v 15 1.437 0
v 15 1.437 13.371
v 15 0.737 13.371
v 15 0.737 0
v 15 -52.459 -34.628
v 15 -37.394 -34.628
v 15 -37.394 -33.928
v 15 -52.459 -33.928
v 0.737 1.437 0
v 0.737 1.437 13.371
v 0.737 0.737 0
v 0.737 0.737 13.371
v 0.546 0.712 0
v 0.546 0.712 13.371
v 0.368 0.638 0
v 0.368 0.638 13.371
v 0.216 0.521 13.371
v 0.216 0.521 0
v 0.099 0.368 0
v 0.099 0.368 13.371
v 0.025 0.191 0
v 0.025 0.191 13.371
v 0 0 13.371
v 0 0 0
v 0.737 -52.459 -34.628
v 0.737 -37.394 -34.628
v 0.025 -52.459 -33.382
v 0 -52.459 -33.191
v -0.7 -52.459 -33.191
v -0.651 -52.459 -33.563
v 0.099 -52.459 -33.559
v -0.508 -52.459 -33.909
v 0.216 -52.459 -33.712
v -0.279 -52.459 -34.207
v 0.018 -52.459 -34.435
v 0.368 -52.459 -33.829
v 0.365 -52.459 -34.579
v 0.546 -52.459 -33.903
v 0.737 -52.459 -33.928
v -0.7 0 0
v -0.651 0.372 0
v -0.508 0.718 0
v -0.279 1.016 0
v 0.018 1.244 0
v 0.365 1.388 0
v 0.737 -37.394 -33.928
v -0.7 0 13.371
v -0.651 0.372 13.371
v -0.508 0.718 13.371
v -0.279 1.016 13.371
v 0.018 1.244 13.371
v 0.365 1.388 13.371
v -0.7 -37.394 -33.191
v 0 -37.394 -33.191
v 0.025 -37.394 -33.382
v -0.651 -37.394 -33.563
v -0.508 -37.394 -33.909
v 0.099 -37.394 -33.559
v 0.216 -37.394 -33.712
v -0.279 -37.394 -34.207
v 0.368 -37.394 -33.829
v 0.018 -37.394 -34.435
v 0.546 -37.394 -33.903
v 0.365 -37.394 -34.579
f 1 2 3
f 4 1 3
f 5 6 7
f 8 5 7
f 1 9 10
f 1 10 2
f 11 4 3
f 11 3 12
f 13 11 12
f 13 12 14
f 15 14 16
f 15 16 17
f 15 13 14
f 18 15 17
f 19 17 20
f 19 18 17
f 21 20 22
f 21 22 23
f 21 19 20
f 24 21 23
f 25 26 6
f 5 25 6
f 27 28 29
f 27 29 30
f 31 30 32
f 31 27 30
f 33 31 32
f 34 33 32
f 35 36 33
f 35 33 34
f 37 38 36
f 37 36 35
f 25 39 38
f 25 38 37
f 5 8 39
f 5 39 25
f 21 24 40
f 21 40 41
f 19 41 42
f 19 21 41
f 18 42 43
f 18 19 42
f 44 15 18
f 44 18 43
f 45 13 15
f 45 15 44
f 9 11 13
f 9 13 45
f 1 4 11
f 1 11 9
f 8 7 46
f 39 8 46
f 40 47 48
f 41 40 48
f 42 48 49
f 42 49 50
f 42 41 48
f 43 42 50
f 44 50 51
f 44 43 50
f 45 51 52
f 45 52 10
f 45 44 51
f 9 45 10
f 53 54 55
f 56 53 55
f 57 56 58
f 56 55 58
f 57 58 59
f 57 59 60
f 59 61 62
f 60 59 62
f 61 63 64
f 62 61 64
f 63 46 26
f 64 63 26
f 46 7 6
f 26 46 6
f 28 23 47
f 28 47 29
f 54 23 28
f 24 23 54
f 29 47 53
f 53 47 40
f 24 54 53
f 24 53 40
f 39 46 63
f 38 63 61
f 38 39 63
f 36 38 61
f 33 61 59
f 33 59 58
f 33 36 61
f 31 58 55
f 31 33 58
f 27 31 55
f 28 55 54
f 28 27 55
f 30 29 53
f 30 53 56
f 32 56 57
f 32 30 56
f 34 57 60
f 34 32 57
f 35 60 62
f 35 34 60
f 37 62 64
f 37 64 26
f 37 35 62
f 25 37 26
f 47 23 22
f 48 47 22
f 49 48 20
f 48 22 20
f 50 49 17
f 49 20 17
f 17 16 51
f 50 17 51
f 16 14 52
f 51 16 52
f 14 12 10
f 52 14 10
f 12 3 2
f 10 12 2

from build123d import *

# Parameters (mm, degrees)
BASE_FLANGE1_DEPTH      = 0.7
EDGE_FLANGE1_DEPTH      = 13.370958639
EDGE_FLANGE1_BEND_DEPTH = 15.064251929


# Sheet-metal steps are written as plain solids
with BuildPart() as part:
    # Sketch1 → Base-Flange1 (new body)
    with BuildSketch(Plane(origin=(0, 0, 0), x_dir=(0, 0, -1), z_dir=(1, 0, 0))):
        Polygon((0, 0), (-13.370958639, 0), (33.191160263, -52.458728532), (33.191160263, -37.394476603), align=None)
    extrude(amount=-BASE_FLANGE1_DEPTH)

    # Edge-Flange1 section (across the edge) → Edge-Flange1 (add)
    with BuildSketch(Plane(origin=(0, 0.7366, 0), x_dir=(0, -1, 0), z_dir=(0, 0, 1))):
        with BuildLine():
            Line((-0.7, 0.7366), (-0.7, 15))
            Line((-0.7, 15), (0, 15))
            Line((0, 15), (0, 0.7366))
            ThreePointArc((0, 0.7366), (0.215745145, 0.215745145), (0.7366, 0))
            Line((0.7366, 0), (0.7366, -0.7))
            ThreePointArc((0.7366, -0.7), (-0.279229602, -0.279229602), (-0.7, 0.7366))
        make_face()
    extrude(amount=EDGE_FLANGE1_DEPTH)

    # Edge-Flange1 section 2 (across the edge) → Edge-Flange1 bend (add)
    with BuildSketch(Plane(origin=(0, -52.458728532, -33.927760263), x_dir=(0, 0, 1), z_dir=(0, 1, 0))):
        with BuildLine():
            Line((-0.7, 0.7366), (-0.7, 15))
            Line((-0.7, 15), (0, 15))
            Line((0, 15), (0, 0.7366))
            ThreePointArc((0, 0.7366), (0.215745145, 0.215745145), (0.7366, 0))
            Line((0.7366, 0), (0.7366, -0.7))
            ThreePointArc((0.7366, -0.7), (-0.279229602, -0.279229602), (-0.7, 0.7366))
        make_face()
    extrude(amount=EDGE_FLANGE1_BEND_DEPTH)


solid = part.part
